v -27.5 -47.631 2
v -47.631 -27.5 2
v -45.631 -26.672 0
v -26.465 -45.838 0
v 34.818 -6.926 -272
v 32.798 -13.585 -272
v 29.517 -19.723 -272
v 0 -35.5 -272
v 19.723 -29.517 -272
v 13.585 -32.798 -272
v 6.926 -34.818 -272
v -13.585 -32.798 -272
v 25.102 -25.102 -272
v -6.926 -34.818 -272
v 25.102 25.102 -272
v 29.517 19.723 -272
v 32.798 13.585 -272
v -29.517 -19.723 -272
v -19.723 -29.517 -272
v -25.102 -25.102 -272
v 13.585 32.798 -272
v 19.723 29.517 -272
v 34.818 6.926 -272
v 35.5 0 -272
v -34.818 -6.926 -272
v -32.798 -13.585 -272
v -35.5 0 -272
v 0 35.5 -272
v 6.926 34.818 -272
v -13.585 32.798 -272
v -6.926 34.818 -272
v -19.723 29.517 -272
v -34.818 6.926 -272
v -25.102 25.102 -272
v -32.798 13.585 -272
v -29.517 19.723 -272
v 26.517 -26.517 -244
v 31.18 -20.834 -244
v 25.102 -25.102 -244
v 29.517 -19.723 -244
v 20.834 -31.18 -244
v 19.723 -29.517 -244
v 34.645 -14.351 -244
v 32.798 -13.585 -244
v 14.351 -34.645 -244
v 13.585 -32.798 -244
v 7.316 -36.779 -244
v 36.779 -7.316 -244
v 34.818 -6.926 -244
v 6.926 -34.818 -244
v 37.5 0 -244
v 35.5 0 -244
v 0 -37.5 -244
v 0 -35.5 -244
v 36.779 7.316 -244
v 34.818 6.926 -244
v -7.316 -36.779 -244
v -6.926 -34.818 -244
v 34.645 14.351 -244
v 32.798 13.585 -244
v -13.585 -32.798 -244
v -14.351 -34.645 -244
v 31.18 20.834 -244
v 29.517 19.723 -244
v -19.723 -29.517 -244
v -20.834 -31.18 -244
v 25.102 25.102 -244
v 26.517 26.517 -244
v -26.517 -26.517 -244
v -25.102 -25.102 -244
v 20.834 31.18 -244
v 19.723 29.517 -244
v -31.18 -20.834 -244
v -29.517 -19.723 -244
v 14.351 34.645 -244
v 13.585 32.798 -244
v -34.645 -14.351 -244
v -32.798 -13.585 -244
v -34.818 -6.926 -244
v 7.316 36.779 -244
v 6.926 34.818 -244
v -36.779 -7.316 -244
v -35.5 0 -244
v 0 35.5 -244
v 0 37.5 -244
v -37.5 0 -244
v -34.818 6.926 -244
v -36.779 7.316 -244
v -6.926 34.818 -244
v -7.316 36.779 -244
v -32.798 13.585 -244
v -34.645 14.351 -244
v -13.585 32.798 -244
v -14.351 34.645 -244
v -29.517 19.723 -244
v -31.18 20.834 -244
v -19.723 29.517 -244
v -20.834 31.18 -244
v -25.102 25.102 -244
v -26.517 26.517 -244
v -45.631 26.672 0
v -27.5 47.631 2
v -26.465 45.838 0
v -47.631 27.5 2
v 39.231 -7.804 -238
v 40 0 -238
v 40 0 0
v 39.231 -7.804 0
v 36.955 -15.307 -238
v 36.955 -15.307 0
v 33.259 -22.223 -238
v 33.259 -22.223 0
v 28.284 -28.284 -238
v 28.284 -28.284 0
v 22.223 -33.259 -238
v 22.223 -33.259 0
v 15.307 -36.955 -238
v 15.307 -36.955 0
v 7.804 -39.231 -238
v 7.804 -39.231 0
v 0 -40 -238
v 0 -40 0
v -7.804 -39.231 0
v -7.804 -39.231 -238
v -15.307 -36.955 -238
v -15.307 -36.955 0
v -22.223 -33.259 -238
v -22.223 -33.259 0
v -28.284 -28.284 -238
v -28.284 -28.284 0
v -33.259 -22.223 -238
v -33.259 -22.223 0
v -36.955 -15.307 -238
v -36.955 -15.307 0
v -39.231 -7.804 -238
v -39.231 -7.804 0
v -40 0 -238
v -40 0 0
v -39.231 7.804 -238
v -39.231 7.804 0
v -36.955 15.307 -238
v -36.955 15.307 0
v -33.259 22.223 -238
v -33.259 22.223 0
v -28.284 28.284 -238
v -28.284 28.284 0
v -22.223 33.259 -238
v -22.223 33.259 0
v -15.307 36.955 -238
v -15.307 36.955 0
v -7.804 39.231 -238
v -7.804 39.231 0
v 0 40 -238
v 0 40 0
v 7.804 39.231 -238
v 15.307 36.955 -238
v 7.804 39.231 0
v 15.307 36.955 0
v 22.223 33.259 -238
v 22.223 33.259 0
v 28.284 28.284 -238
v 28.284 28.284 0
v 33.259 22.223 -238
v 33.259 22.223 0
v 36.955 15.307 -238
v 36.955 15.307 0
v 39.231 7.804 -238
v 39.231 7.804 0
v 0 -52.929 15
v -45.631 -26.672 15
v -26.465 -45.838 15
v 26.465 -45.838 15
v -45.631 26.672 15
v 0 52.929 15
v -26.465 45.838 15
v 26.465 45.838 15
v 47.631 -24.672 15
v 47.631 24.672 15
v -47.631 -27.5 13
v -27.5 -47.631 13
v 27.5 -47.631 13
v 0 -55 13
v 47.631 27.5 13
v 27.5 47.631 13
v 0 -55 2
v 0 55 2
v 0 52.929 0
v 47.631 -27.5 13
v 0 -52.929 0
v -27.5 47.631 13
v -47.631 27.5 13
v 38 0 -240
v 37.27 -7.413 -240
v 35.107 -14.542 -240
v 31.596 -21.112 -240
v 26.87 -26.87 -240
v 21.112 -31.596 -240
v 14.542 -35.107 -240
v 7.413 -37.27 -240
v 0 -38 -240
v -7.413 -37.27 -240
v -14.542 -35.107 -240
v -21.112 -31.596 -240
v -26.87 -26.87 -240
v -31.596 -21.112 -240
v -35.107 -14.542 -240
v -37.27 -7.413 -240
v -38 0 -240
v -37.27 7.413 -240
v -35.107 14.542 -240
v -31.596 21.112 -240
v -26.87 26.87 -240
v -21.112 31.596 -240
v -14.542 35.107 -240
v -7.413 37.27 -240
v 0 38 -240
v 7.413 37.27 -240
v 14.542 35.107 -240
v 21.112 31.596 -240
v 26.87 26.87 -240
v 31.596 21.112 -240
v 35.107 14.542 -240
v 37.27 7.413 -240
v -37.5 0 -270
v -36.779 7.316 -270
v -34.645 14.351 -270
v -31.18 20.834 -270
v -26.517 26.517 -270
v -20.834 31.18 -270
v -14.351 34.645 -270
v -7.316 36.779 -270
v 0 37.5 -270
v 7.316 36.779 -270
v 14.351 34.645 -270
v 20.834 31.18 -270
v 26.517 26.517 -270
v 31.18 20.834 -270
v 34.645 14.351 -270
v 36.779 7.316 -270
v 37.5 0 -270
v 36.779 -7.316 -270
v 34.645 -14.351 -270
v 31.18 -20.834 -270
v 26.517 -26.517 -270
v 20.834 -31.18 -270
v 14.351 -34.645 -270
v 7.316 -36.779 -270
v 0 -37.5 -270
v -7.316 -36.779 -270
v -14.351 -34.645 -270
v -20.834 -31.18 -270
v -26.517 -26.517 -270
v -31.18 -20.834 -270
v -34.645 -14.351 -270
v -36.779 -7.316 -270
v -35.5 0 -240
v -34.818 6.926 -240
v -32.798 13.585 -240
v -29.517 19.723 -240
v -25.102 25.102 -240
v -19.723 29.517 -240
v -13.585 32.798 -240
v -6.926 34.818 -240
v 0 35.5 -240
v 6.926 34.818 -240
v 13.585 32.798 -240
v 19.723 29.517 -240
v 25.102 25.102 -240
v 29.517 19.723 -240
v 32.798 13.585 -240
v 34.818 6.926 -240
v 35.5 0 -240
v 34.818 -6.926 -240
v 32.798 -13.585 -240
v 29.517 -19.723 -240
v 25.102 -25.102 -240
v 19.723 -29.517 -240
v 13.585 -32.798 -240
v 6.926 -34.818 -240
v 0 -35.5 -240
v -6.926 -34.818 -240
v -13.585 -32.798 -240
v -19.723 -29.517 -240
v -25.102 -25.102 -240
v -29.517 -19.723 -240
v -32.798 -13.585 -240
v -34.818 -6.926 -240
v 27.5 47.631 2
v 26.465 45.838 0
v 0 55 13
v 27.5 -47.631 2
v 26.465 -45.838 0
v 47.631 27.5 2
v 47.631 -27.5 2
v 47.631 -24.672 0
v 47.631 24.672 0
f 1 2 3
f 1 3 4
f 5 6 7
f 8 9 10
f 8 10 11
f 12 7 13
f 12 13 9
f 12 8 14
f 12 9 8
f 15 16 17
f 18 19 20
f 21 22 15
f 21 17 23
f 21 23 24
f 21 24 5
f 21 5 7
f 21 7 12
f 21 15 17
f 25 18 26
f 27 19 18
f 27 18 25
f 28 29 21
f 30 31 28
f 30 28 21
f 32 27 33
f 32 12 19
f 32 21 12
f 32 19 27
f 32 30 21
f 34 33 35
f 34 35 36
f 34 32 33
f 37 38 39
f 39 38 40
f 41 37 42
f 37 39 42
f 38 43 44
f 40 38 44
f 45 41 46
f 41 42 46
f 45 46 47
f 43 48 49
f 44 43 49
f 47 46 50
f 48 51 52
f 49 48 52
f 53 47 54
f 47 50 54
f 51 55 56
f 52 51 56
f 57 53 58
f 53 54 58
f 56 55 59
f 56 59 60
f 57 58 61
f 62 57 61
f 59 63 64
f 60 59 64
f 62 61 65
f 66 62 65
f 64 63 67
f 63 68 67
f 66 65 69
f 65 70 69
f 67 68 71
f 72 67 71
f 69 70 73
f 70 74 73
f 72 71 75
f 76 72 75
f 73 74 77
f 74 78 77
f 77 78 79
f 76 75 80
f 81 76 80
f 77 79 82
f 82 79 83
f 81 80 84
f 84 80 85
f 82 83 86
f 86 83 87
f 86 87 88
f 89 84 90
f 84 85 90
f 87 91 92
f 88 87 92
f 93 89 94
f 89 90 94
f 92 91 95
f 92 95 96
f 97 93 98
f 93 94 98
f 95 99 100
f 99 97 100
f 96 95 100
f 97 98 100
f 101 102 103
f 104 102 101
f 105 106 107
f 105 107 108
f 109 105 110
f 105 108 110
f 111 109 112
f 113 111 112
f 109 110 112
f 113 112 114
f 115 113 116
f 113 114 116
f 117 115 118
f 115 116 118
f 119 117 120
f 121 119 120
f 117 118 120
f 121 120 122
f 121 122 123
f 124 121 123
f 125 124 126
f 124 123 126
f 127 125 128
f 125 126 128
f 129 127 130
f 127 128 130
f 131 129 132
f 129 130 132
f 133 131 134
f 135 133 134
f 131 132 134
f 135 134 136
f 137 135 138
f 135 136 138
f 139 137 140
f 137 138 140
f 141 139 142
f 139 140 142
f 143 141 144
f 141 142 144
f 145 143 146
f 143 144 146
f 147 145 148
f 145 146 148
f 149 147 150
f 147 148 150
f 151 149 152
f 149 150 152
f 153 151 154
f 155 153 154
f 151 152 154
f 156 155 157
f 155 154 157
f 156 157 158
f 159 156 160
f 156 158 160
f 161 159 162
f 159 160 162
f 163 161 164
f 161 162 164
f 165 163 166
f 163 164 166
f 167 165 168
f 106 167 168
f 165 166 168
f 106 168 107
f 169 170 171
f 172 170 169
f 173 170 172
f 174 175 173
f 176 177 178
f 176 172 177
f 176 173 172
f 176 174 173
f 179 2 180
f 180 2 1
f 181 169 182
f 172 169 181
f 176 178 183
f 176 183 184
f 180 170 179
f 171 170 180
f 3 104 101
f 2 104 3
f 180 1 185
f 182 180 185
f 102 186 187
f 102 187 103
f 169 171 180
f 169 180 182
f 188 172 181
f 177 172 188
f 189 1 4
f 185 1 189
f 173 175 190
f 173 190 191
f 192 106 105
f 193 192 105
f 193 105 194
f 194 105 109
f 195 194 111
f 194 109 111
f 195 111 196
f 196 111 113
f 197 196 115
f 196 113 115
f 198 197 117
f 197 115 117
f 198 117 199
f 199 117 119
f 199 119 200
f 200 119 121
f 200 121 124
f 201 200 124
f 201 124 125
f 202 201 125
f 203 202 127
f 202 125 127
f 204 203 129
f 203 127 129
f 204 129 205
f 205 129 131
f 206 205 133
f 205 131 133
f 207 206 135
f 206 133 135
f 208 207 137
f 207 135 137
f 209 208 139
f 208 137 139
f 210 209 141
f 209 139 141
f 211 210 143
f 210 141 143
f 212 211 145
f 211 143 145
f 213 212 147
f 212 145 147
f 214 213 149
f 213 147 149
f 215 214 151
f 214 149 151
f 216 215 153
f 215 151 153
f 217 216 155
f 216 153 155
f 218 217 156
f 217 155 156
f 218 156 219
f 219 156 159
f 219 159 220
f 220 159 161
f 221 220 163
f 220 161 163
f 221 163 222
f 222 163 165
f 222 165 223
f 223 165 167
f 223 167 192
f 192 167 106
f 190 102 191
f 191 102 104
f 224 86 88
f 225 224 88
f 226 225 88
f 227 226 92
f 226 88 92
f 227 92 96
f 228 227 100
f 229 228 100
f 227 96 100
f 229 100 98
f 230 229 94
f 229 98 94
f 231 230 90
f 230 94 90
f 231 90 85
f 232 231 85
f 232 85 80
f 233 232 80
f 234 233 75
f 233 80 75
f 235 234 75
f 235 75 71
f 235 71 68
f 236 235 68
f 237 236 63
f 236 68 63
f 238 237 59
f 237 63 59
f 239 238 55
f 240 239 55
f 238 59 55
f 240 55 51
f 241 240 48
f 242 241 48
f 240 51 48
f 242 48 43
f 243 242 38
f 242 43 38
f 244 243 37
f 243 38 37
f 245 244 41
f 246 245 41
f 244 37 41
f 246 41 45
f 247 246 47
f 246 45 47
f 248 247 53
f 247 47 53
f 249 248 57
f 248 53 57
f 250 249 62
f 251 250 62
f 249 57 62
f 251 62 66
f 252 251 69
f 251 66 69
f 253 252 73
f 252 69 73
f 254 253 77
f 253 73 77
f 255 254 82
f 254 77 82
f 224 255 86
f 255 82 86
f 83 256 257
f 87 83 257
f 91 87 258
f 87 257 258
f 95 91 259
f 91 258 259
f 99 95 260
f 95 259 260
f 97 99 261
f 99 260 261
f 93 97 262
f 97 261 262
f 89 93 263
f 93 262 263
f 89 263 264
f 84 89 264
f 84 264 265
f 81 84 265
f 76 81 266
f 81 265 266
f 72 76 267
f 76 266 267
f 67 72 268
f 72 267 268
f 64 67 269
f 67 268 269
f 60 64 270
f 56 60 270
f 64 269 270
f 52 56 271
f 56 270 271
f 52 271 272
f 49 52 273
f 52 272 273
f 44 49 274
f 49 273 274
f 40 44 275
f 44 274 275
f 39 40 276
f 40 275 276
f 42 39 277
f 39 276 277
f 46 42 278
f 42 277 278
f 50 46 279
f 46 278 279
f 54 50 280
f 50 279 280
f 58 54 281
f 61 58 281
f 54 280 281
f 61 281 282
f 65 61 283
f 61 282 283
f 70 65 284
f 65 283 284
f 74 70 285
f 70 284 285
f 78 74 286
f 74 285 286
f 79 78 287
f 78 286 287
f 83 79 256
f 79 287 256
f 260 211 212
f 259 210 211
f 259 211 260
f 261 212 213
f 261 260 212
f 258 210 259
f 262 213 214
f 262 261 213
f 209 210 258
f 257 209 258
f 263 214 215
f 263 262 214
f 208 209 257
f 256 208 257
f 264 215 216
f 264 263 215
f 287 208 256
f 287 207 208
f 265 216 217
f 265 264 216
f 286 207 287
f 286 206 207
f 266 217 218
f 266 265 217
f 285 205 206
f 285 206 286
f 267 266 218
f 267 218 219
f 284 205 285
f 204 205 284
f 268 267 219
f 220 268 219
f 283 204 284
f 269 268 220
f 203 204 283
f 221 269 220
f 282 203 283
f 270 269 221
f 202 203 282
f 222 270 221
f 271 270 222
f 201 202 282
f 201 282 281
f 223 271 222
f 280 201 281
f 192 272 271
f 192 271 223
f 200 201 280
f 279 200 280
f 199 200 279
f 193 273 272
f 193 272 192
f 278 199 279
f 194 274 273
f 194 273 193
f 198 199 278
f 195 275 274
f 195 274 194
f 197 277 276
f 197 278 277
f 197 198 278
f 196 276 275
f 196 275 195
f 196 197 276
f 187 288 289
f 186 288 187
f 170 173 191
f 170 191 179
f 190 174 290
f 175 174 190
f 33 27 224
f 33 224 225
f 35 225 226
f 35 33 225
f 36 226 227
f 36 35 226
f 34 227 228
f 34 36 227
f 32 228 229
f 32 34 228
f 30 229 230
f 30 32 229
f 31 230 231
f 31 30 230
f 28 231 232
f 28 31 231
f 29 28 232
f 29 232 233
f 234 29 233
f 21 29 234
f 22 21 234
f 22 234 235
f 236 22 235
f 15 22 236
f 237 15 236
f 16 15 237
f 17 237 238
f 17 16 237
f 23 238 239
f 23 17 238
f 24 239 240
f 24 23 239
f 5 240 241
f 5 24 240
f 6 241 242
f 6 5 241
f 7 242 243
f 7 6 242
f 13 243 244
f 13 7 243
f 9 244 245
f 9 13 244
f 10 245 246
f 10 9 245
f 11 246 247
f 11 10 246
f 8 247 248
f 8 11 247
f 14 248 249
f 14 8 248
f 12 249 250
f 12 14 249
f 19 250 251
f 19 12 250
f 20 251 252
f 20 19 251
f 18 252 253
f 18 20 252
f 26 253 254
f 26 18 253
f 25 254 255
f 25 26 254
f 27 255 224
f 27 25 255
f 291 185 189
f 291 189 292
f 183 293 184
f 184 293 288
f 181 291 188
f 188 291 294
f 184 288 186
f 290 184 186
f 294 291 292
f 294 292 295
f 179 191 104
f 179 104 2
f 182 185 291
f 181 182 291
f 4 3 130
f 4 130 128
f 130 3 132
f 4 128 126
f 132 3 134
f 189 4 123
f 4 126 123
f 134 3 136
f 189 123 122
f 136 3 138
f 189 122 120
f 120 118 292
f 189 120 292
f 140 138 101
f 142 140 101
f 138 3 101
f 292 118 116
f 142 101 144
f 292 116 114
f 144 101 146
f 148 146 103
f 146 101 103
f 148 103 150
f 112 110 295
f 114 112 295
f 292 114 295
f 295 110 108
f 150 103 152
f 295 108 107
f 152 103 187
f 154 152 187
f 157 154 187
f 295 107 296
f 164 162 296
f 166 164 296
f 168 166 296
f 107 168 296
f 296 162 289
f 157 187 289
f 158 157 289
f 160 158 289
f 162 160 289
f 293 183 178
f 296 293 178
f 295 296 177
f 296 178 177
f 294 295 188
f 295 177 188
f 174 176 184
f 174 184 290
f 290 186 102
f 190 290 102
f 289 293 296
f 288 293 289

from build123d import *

# Parameters (mm, degrees)
EXTRUDE_1_DEPTH     = 15
CUT_EXTRUDE_1_DEPTH = 80.214897589
SKETCH_3_R          = 40
EXTRUDE_2_DEPTH     = 240
SKETCH_4_R          = 35.5
EXTRUDE_3_DEPTH     = 4
SKETCH_5_R          = 37.5
EXTRUDE_4_DEPTH     = 28
CHAMFER_1_SIZE      = 2


with BuildPart() as part:
    # 草图1 → 凸台-拉伸1 (new body)
    with BuildSketch(Plane.XY):
        Polygon((-27.5, 47.631397208), (-47.631397208, 27.5), (-55, 0), (-47.631397208, -27.5), (-27.5, -47.631397208), (0, -55), (27.5, -47.631397208), (47.631397208, -27.5), (55, 0), (47.631397208, 27.5), (27.5, 47.631397208), (0, 55), align=None)
    extrude(amount=EXTRUDE_1_DEPTH)

    # 草图2 → 切除-拉伸1 (cut, through all)
    with BuildSketch(Plane.XY.offset(15)):
        Polygon((-47.631397208, 27.5), (-47.631397208, -27.5), (-55, 0), align=None)
        Polygon((47.631397208, 27.5), (47.631397208, -27.5), (55, 0), align=None)
    extrude(amount=-CUT_EXTRUDE_1_DEPTH, mode=Mode.SUBTRACT)

    # 草图3 → 凸台-拉伸2 (add)
    with BuildSketch(Plane(origin=(0, 0, 0), x_dir=(-1, 0, 0), z_dir=(0, 0, -1))):
        with Locations(Location((0, 0, 0), (0, 0, 180))):
            Circle(SKETCH_3_R)
    extrude(amount=EXTRUDE_2_DEPTH)

    # 草图4 → 凸台-拉伸3 (add)
    with BuildSketch(Plane(origin=(0, 0, -240), x_dir=(-1, 0, 0), z_dir=(0, 0, -1))):
        Circle(SKETCH_4_R)
    extrude(amount=EXTRUDE_3_DEPTH)

    # 草图5 → 凸台-拉伸4 (add)
    with BuildSketch(Plane(origin=(0, 0, -244), x_dir=(-1, 0, 0), z_dir=(0, 0, -1))):
        Circle(SKETCH_5_R)
    extrude(amount=EXTRUDE_4_DEPTH)

    # 倒角1
    chamfer_1_edges = [part.edges().sort_by_distance(p)[0] for p in [
        (13.75, 51.315698604, 0),
        (37.565698604, 37.565698604, 0),
        (37.565698604, -37.565698604, 0),
        (13.75, -51.315698604, 0),
        (-13.75, -51.315698604, 0),
        (-37.565698604, -37.565698604, 0),
        (-37.565698604, 37.565698604, 0),
        (-13.75, 51.315698604, 0),
        (-37.565698604, -37.565698604, 15),
        (-13.75, -51.315698604, 15),
        (13.75, -51.315698604, 15),
        (37.565698604, -37.565698604, 15),
        (37.565698604, 37.565698604, 15),
        (-47.631397208, 0, 0),
        (13.75, 51.315698604, 15),
        (-47.631397208, 0, 15),
        (-13.75, 51.315698604, 15),
        (-40, 0, -240),
        (37.5, 0, -272),
        (-37.565698604, 37.565698604, 15),
    ]]
    chamfer(chamfer_1_edges, length=CHAMFER_1_SIZE)


solid = part.part
